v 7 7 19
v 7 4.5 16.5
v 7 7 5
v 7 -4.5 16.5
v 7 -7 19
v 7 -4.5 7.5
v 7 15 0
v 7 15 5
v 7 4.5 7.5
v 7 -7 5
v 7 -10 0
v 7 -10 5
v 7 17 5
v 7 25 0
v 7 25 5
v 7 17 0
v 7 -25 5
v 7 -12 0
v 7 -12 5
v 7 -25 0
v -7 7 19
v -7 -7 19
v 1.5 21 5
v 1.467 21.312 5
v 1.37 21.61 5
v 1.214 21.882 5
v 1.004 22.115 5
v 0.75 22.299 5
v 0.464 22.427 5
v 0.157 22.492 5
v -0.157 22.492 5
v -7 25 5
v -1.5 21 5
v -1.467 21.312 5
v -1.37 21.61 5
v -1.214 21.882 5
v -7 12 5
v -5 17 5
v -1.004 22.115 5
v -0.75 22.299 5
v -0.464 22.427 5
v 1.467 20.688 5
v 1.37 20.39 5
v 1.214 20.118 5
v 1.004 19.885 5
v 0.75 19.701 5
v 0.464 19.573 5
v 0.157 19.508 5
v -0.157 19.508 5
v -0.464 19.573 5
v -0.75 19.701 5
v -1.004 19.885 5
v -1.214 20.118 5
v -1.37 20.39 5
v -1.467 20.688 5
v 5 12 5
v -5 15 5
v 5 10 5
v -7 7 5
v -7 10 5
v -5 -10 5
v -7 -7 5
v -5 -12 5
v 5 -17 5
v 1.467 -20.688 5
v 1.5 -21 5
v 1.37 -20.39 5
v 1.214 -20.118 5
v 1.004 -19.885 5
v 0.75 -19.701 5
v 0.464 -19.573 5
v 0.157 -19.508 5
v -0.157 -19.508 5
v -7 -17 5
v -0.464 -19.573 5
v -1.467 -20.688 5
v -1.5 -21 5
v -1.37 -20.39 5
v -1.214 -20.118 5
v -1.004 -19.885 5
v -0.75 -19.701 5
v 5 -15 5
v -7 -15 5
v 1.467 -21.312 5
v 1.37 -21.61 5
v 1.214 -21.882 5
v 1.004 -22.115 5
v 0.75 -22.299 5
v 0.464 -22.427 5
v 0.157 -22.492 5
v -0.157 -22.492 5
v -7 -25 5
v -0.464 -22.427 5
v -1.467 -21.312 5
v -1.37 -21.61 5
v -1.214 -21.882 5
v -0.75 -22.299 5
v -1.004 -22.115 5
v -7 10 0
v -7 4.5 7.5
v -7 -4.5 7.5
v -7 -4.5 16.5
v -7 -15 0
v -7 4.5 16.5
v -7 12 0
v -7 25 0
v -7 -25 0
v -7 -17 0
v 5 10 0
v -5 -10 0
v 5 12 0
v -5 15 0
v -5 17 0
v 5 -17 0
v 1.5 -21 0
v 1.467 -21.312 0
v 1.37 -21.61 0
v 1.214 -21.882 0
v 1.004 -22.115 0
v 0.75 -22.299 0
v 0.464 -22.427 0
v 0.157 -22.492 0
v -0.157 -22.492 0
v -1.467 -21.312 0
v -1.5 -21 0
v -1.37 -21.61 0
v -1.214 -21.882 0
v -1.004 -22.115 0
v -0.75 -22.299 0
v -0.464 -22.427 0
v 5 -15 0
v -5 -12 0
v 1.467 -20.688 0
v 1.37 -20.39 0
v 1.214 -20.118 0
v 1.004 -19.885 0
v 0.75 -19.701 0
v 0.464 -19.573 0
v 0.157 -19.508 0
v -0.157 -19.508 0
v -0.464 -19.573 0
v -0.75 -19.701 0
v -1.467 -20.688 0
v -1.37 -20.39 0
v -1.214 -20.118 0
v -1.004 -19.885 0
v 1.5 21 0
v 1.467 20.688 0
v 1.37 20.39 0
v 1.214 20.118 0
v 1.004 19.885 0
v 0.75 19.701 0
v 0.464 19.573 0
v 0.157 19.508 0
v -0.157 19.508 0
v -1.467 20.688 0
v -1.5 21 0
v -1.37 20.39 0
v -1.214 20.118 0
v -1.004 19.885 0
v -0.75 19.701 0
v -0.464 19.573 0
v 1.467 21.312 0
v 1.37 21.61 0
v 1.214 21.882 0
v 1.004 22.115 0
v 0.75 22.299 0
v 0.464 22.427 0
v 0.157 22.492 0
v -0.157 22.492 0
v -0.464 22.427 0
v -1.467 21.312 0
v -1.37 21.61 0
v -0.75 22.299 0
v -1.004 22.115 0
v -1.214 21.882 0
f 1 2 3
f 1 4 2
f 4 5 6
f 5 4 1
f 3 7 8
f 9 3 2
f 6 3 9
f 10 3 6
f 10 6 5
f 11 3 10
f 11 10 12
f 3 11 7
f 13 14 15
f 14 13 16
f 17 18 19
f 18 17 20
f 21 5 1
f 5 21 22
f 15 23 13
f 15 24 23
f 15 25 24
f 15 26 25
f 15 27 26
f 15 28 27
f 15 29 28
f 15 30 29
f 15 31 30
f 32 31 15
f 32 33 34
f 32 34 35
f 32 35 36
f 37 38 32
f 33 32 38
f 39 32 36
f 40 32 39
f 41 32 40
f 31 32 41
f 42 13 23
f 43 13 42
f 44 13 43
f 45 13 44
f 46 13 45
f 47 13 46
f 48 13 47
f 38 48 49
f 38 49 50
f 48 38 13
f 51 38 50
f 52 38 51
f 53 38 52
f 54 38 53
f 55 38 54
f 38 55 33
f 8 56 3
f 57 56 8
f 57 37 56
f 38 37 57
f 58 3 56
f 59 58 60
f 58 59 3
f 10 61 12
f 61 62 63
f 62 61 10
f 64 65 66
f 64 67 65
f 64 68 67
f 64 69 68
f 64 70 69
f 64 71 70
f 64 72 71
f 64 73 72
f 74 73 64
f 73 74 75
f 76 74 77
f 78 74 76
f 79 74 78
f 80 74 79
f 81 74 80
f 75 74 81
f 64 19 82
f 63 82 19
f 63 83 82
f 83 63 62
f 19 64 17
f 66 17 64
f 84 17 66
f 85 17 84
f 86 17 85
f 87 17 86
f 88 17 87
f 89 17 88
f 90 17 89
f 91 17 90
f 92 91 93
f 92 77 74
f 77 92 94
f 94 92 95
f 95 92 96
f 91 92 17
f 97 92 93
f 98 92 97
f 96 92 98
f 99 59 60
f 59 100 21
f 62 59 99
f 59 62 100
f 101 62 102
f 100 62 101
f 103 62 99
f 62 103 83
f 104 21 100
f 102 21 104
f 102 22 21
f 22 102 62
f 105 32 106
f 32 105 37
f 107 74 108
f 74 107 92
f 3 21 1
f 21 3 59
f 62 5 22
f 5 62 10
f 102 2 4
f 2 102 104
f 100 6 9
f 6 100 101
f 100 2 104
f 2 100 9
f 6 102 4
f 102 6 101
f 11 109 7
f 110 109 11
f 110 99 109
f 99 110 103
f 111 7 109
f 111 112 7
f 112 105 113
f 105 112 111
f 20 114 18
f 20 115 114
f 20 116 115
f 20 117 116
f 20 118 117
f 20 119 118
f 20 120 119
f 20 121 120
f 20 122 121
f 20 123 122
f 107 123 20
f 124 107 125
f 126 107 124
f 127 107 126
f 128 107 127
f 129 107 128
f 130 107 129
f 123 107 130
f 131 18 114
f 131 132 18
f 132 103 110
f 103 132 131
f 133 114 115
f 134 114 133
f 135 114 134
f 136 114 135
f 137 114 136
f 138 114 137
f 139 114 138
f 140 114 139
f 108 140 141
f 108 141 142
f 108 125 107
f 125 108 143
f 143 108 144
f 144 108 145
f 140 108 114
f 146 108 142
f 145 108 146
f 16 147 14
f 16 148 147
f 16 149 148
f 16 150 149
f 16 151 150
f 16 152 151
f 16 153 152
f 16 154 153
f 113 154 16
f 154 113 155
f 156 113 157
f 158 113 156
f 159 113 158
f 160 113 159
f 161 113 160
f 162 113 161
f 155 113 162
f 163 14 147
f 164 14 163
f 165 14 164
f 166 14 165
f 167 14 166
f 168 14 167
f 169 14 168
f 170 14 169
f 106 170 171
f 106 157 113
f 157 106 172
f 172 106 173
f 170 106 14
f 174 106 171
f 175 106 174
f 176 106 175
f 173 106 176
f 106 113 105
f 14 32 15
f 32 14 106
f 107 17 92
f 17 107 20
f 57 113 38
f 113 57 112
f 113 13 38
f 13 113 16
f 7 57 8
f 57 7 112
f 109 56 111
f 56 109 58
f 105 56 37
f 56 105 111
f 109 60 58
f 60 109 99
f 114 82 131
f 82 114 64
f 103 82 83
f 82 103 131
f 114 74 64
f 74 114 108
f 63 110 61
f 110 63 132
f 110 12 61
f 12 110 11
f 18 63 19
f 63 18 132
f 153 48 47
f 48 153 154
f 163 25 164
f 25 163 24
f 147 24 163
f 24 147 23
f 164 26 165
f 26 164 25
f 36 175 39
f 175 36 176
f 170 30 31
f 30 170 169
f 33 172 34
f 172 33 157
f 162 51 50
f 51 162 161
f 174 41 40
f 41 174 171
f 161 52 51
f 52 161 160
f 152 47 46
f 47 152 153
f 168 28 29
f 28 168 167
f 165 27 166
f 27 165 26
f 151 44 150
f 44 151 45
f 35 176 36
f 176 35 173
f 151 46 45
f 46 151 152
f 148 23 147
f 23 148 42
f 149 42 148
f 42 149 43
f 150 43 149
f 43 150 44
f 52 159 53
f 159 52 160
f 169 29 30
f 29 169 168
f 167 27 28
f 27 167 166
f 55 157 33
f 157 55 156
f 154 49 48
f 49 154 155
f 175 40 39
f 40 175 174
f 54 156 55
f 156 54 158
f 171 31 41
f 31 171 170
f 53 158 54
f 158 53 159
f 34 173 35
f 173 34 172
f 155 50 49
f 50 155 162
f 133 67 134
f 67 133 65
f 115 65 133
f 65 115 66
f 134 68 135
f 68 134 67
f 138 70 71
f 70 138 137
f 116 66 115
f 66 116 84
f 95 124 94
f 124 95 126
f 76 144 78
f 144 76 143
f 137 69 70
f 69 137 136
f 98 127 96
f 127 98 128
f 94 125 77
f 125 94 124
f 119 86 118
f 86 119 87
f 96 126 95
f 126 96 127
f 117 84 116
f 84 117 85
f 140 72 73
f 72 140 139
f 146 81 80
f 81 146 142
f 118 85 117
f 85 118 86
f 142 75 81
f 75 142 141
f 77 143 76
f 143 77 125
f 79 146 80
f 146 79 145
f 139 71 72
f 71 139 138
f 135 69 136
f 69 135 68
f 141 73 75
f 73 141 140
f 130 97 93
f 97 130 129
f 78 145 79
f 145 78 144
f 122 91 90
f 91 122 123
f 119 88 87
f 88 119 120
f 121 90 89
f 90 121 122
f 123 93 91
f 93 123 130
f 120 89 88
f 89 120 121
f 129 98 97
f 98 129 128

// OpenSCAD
translate(v = [0,0,5])difference(){
translate(v = [0,0,7]) cube(size = [14,14,14], center = true);
translate(v = [0,0,7]) cube(size = [17,9,9], center = true);
}
difference(){
translate(v = [0,0,2.5]) cube(size = [14,50,5], center = true);

translate(v = [2,16,2.5]) cube(size = [14,2,7], center = true);
translate(v = [-2,11,2.5]) cube(size = [14,2,7], center = true);


translate(v = [-2,-16,2.5]) cube(size = [14,2,7], center = true);
translate(v = [2,-11,2.5]) cube(size = [14,2,7], center = true);

translate(v = [0,21,-1])  cylinder(h = 80, r=1.5, $fn=30);
translate(v = [0,-21,-1])  cylinder(h = 80, r=1.5, $fn=30);
}
